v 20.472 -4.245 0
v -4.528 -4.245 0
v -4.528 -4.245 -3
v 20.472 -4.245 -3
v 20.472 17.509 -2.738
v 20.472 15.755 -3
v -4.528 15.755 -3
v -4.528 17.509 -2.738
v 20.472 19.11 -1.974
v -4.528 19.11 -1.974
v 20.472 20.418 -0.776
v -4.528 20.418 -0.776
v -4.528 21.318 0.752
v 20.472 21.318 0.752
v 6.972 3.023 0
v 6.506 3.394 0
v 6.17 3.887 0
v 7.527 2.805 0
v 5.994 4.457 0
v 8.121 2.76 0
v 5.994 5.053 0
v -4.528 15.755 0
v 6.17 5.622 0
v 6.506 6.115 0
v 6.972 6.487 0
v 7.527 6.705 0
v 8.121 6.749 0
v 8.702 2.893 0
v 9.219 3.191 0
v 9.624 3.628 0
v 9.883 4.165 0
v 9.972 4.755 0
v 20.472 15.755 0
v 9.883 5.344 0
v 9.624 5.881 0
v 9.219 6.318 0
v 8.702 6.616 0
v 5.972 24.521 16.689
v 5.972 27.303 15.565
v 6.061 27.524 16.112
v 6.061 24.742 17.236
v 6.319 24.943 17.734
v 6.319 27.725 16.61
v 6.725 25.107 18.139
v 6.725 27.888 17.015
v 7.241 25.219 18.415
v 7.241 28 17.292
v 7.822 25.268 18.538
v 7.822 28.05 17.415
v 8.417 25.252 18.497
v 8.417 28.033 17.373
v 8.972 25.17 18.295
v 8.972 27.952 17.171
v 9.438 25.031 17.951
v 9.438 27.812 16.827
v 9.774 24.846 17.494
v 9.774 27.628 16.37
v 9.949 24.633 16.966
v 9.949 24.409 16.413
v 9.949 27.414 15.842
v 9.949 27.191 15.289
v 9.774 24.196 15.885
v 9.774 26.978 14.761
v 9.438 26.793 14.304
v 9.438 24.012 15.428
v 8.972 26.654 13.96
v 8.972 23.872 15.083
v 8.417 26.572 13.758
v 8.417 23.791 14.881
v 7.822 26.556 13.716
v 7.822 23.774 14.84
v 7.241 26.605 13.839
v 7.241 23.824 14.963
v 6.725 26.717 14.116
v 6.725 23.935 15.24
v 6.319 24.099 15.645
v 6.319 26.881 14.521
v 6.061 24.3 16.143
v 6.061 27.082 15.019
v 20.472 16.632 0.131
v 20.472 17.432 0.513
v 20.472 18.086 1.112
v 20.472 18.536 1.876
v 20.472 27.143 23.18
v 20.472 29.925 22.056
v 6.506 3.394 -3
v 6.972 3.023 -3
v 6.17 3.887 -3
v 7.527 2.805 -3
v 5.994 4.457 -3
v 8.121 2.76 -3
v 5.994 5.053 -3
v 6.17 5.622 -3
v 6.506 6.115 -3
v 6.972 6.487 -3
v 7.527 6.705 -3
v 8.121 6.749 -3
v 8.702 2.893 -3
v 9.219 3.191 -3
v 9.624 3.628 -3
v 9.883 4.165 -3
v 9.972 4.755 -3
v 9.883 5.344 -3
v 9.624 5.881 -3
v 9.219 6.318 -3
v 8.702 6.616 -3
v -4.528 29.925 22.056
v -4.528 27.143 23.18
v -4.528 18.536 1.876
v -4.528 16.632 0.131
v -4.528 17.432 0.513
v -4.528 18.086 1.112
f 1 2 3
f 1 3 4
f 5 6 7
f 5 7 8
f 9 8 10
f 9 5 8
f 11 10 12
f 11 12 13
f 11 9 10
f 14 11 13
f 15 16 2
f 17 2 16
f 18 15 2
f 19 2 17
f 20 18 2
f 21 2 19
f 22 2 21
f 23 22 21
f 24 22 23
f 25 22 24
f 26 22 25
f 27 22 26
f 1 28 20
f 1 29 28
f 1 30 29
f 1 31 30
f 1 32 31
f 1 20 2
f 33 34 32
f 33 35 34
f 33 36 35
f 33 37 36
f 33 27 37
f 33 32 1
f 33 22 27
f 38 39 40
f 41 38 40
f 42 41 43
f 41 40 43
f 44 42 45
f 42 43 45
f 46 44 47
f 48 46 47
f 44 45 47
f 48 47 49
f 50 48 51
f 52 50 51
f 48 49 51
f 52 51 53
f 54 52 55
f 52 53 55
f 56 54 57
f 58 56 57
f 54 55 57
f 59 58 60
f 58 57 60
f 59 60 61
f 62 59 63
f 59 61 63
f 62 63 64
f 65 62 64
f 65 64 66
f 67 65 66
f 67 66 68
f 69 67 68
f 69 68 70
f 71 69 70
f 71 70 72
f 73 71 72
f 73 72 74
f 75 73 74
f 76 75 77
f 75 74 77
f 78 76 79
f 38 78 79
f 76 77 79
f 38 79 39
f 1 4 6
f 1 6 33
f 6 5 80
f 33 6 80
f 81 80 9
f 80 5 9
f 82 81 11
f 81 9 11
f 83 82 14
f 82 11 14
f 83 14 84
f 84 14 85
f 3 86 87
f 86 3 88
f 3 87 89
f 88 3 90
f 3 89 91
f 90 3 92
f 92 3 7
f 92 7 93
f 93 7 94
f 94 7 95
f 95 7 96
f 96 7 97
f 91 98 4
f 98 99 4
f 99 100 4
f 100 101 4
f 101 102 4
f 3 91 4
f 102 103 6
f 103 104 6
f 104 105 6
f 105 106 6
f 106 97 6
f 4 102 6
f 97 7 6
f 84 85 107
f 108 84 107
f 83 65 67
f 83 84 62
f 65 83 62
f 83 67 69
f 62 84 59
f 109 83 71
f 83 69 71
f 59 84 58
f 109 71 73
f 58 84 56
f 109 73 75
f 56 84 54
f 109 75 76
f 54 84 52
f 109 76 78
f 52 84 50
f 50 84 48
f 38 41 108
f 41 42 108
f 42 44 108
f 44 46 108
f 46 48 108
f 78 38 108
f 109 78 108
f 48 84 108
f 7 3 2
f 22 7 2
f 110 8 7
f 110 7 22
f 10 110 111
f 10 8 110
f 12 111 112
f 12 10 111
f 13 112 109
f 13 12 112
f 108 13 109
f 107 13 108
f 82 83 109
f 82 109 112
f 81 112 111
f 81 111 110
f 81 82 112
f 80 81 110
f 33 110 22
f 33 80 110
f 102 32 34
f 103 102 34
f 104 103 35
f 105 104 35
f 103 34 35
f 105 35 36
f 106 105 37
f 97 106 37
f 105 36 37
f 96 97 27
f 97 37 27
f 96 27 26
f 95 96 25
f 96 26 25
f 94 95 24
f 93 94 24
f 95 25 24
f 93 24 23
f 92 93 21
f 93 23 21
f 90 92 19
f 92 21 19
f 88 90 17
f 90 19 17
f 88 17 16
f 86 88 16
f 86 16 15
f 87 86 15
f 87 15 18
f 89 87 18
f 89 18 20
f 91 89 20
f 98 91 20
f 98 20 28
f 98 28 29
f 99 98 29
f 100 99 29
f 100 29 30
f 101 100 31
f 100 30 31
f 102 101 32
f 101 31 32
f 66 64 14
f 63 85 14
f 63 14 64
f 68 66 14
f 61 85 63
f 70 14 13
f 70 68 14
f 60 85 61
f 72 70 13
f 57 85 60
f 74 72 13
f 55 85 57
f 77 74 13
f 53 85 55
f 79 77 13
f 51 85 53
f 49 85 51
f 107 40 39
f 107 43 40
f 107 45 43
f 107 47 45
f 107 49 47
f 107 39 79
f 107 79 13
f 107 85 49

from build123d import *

# Parameters (mm, degrees)
SKETCH1_W               = 25
SKETCH1_H               = 20
SKETCH1_R               = 2
BASE_FLANGE1_DEPTH      = 3
EDGE_FLANGE1_DEPTH      = 25
EDGE_FLANGE1_START      = 3
EDGE_FLANGE1_PROFILE_W  = 25
EDGE_FLANGE1_PROFILE_H  = 22.976474449
EDGE_FLANGE1_PROFILE_R  = 2
EDGE_FLANGE1_FLAT_DEPTH = 3


# Sheet-metal steps are written as plain solids
with BuildPart() as part:
    # Sketch1 → Base-Flange1 (new body)
    with BuildSketch(Plane.XY):
        with Locations((7.971698113, 5.754716981)):
            Rectangle(SKETCH1_W, SKETCH1_H)
        with Locations((7.971698113, 4.754716981)):
            Circle(SKETCH1_R, mode=Mode.SUBTRACT)
    extrude(amount=-BASE_FLANGE1_DEPTH)

    # Edge-Flange1 bend section (across the edge) → Edge-Flange1 (add)
    with BuildSketch(Plane(origin=(20.471698113, 17.778242532, 0), x_dir=(0, -0.9271838545667858, 0.3746065934159162), z_dir=(-1, 0, 0))):
        with BuildLine():
            Line((-3, 2.023525551), (0, 2.023525551))
            ThreePointArc((0, 2.023525551), (0.512887282, 0.34594684), (1.87618022, -0.758026013))
            Line((1.87618022, -0.758026013), (0.75236044, -3.539577577))
            ThreePointArc((0.75236044, -3.539577577), (-1.974225435, -1.33163187), (-3, 2.023525551))
        make_face()
    extrude(amount=EDGE_FLANGE1_DEPTH)

    # Edge-Flange1 profile (on flange) → Edge-Flange1 flat (add)
    with BuildSketch(Plane(origin=(0, 17.778242532, 0), x_dir=(-1, 0, 0), z_dir=(0, 0.9271838545667858, -0.3746065934159162)).offset(EDGE_FLANGE1_START)):
        with Locations((-7.971698113, 13.511762775)):
            Rectangle(EDGE_FLANGE1_PROFILE_W, EDGE_FLANGE1_PROFILE_H)
        with Locations((-7.971698113, 18)):
            Circle(EDGE_FLANGE1_PROFILE_R, mode=Mode.SUBTRACT)
    extrude(amount=-EDGE_FLANGE1_FLAT_DEPTH)


solid = part.part
